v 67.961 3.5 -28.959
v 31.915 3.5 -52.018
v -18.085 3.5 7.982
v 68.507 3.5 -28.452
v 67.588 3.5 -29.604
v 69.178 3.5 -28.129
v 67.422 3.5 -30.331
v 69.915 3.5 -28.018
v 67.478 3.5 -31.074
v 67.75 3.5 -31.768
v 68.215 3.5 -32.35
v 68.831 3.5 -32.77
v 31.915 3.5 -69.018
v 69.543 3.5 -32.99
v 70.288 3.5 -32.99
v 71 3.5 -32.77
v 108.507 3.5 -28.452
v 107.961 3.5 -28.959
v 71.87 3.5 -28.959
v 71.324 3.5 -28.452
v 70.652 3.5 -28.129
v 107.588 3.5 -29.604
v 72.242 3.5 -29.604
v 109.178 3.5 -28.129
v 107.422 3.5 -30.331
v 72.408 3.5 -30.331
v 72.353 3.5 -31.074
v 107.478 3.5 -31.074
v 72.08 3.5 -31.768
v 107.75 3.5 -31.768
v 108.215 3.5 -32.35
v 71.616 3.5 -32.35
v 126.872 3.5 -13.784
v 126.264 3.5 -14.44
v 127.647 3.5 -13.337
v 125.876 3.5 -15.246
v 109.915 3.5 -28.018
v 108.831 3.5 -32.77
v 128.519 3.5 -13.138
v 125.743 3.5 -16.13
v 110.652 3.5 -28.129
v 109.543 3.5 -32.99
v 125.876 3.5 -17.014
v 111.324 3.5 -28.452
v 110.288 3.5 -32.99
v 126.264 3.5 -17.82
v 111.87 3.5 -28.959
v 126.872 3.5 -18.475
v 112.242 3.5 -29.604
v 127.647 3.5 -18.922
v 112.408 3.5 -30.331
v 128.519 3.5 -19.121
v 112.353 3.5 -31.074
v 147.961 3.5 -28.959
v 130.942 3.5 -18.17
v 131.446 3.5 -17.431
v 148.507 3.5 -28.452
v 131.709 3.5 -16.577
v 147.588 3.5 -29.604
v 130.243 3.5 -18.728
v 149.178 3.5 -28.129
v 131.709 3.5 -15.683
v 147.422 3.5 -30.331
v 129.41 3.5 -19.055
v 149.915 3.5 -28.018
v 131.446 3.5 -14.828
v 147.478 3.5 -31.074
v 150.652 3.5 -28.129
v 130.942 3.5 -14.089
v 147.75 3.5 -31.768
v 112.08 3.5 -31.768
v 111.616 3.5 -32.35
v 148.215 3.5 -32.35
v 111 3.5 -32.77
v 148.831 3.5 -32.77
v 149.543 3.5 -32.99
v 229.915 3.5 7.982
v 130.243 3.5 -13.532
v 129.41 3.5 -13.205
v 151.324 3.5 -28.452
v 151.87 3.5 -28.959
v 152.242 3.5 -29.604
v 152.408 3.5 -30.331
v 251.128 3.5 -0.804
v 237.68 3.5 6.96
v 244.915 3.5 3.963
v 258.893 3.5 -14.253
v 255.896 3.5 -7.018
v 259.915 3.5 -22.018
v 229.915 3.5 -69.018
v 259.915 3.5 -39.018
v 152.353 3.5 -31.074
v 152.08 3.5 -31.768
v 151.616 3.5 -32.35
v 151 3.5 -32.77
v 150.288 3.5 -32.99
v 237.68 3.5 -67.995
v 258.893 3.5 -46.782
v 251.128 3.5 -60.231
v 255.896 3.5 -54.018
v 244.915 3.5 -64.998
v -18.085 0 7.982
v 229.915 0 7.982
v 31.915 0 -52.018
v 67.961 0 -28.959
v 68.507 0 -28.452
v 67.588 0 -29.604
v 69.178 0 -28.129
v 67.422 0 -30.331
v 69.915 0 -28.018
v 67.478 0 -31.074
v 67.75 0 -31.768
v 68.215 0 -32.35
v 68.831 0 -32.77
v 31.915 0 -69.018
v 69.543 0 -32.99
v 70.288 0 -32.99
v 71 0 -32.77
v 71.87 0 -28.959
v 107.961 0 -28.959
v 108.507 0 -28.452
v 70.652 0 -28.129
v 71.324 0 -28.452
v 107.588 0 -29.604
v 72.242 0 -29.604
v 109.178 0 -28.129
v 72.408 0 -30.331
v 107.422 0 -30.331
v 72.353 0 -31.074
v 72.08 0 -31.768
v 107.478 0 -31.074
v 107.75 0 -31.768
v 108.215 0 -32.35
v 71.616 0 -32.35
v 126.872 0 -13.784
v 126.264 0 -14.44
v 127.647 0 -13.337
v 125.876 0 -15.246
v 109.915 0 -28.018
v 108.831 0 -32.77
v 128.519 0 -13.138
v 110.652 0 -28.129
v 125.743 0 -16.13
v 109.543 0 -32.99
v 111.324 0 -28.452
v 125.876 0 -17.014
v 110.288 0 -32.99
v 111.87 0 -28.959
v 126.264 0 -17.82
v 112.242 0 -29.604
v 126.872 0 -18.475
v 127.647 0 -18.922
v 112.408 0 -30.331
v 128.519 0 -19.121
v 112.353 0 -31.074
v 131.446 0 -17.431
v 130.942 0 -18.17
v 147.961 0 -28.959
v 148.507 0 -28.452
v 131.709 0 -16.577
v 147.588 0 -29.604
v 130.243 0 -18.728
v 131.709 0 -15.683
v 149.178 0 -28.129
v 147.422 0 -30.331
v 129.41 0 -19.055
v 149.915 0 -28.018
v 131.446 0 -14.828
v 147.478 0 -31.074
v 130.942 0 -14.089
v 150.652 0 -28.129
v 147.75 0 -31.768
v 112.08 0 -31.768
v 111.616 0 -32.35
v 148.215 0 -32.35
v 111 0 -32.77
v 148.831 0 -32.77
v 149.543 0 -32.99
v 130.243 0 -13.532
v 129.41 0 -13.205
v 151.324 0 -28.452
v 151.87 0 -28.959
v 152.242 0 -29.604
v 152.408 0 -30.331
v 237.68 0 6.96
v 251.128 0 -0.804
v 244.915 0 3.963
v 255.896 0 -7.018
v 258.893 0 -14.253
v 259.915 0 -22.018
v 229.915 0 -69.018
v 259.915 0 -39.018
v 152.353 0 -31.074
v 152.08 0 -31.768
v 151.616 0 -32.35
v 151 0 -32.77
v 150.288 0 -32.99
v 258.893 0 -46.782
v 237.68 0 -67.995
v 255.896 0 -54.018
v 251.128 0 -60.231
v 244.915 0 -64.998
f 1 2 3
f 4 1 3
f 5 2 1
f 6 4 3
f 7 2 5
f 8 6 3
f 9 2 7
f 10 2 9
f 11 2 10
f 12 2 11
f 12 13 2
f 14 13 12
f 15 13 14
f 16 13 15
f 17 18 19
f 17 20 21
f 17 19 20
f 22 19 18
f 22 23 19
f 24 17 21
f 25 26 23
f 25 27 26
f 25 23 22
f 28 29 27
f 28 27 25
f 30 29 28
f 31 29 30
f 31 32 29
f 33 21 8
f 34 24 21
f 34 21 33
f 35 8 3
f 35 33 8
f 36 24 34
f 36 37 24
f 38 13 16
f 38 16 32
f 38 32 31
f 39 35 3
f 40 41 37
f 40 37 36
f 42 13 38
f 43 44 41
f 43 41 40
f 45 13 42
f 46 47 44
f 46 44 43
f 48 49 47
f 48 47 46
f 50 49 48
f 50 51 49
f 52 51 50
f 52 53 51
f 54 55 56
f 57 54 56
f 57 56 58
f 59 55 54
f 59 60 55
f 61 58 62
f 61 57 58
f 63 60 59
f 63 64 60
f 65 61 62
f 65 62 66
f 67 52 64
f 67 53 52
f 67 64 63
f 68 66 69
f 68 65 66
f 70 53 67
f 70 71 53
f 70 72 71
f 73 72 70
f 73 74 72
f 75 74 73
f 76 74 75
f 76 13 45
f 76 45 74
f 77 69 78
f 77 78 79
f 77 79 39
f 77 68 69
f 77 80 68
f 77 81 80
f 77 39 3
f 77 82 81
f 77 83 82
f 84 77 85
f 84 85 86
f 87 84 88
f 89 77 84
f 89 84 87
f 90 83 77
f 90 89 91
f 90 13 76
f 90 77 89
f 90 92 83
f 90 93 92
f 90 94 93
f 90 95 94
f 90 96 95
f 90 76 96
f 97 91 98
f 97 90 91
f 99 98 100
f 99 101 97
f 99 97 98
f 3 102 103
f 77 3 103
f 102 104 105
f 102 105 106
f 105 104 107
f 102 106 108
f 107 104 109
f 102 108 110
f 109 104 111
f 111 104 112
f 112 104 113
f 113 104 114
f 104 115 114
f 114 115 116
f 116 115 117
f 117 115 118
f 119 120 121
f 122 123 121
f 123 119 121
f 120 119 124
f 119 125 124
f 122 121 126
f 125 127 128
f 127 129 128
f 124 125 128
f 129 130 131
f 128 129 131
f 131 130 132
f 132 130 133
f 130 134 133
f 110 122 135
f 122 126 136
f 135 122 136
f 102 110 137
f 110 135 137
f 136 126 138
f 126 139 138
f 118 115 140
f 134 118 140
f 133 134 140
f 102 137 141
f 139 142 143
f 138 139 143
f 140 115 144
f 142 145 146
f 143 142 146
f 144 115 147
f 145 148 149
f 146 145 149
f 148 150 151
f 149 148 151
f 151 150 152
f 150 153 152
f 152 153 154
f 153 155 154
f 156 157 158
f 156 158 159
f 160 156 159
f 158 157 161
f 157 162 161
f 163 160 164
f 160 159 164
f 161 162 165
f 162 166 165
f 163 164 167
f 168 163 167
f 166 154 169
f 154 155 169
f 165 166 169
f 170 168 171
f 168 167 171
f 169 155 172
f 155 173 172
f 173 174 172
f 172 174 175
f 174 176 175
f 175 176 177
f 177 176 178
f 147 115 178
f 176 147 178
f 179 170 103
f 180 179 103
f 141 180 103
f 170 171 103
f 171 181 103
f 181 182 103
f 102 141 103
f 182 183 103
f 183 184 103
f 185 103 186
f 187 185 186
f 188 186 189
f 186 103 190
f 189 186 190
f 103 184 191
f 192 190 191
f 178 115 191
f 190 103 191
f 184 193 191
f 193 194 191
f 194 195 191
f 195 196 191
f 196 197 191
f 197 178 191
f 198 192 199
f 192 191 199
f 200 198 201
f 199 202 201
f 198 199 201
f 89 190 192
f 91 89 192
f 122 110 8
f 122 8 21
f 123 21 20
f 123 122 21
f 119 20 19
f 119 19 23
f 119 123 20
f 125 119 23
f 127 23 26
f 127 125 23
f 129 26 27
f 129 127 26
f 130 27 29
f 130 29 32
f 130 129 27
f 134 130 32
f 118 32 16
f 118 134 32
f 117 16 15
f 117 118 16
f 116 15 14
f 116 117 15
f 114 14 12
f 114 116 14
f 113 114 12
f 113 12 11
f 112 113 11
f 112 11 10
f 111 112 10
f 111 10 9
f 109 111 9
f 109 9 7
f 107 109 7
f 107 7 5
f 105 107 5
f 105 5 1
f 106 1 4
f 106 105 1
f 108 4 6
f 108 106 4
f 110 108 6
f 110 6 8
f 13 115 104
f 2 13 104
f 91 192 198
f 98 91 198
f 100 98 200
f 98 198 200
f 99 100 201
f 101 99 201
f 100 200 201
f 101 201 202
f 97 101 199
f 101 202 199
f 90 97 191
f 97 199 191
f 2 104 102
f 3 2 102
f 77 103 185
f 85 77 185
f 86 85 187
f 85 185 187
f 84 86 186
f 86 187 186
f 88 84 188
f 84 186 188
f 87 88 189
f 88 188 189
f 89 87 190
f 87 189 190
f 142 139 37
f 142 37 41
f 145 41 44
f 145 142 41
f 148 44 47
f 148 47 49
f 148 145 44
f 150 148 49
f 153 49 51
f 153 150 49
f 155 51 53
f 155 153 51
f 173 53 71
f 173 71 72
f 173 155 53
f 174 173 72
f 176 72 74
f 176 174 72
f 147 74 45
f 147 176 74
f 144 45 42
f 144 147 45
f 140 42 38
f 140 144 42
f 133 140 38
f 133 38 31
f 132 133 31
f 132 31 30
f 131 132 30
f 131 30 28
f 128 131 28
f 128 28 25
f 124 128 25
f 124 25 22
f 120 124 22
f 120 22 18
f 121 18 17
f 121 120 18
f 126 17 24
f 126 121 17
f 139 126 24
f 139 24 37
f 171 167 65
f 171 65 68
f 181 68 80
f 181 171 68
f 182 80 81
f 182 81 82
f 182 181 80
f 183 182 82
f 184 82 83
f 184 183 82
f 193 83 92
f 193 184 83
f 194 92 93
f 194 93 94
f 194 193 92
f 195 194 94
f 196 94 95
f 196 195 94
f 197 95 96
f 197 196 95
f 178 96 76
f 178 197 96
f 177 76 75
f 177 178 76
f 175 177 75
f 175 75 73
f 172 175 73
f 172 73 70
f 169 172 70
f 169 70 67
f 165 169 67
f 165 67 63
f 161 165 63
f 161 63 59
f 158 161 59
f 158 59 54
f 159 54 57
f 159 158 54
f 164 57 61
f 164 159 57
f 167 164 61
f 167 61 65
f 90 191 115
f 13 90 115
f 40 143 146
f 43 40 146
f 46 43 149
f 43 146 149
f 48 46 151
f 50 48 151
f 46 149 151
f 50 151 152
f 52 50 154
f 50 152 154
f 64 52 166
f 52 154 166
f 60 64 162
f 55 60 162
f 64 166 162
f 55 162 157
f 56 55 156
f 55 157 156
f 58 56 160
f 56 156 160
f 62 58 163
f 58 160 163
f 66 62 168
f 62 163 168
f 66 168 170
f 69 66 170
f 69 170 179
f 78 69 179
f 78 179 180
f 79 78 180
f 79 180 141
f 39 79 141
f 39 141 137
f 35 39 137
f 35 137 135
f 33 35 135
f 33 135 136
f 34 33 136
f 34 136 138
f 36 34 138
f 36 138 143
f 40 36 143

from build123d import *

# Parameters (mm, degrees)
SKETCH1_R             = 2.5
BOSS_EXTRUDE3_DEPTH   = 3.5
F_6_0MM_DOWEL_HOLE4_D = 6


with BuildPart() as part:
    # Sketch1 → Boss-Extrude3 (new body)
    with BuildSketch(Plane(origin=(0, 0, 0), x_dir=(1, 0, 0), z_dir=(0, 1, 0))):
        with BuildLine():
            Line((-18.084732229, -7.982467334), (229.915267771, -7.982467334))
            ThreePointArc((229.915267771, -7.982467334), (251.128471207, 0.80432923), (259.915267771, 22.017532666))
            Line((259.915267771, 22.017532666), (259.915267771, 39.017532666))
            ThreePointArc((259.915267771, 39.017532666), (251.128471207, 60.230736102), (229.915267771, 69.017532666))
            Line((229.915267771, 69.017532666), (31.915267771, 69.017532666))
            Line((31.915267771, 69.017532666), (31.915267771, 65.517532666))
            Line((31.915267771, 65.517532666), (31.915267771, 52.017532666))
            Line((31.915267771, 52.017532666), (-18.084732229, -7.982467334))
        make_face()
        with Locations(Location((149.915267771, 30.517532666, 0), (0, 0, 270))):
            Circle(SKETCH1_R, mode=Mode.SUBTRACT)
        with Locations(Location((109.915267771, 30.517532666, 0), (0, 0, 270))):
            Circle(SKETCH1_R, mode=Mode.SUBTRACT)
        with Locations(Location((69.915267771, 30.517532666, 0), (0, 0, 270))):
            Circle(SKETCH1_R, mode=Mode.SUBTRACT)
    extrude(amount=BOSS_EXTRUDE3_DEPTH)

    # Ø6.0mm Dowel Hole4 (through all)
    with Locations(Plane(origin=(224.539982251, 261.5, -21.544477375), x_dir=(1, 0, 0), z_dir=(0, 1, 0))):
        with Locations((-95.797211751, -5.414641336)):
            Hole(F_6_0MM_DOWEL_HOLE4_D / 2)


solid = part.part
